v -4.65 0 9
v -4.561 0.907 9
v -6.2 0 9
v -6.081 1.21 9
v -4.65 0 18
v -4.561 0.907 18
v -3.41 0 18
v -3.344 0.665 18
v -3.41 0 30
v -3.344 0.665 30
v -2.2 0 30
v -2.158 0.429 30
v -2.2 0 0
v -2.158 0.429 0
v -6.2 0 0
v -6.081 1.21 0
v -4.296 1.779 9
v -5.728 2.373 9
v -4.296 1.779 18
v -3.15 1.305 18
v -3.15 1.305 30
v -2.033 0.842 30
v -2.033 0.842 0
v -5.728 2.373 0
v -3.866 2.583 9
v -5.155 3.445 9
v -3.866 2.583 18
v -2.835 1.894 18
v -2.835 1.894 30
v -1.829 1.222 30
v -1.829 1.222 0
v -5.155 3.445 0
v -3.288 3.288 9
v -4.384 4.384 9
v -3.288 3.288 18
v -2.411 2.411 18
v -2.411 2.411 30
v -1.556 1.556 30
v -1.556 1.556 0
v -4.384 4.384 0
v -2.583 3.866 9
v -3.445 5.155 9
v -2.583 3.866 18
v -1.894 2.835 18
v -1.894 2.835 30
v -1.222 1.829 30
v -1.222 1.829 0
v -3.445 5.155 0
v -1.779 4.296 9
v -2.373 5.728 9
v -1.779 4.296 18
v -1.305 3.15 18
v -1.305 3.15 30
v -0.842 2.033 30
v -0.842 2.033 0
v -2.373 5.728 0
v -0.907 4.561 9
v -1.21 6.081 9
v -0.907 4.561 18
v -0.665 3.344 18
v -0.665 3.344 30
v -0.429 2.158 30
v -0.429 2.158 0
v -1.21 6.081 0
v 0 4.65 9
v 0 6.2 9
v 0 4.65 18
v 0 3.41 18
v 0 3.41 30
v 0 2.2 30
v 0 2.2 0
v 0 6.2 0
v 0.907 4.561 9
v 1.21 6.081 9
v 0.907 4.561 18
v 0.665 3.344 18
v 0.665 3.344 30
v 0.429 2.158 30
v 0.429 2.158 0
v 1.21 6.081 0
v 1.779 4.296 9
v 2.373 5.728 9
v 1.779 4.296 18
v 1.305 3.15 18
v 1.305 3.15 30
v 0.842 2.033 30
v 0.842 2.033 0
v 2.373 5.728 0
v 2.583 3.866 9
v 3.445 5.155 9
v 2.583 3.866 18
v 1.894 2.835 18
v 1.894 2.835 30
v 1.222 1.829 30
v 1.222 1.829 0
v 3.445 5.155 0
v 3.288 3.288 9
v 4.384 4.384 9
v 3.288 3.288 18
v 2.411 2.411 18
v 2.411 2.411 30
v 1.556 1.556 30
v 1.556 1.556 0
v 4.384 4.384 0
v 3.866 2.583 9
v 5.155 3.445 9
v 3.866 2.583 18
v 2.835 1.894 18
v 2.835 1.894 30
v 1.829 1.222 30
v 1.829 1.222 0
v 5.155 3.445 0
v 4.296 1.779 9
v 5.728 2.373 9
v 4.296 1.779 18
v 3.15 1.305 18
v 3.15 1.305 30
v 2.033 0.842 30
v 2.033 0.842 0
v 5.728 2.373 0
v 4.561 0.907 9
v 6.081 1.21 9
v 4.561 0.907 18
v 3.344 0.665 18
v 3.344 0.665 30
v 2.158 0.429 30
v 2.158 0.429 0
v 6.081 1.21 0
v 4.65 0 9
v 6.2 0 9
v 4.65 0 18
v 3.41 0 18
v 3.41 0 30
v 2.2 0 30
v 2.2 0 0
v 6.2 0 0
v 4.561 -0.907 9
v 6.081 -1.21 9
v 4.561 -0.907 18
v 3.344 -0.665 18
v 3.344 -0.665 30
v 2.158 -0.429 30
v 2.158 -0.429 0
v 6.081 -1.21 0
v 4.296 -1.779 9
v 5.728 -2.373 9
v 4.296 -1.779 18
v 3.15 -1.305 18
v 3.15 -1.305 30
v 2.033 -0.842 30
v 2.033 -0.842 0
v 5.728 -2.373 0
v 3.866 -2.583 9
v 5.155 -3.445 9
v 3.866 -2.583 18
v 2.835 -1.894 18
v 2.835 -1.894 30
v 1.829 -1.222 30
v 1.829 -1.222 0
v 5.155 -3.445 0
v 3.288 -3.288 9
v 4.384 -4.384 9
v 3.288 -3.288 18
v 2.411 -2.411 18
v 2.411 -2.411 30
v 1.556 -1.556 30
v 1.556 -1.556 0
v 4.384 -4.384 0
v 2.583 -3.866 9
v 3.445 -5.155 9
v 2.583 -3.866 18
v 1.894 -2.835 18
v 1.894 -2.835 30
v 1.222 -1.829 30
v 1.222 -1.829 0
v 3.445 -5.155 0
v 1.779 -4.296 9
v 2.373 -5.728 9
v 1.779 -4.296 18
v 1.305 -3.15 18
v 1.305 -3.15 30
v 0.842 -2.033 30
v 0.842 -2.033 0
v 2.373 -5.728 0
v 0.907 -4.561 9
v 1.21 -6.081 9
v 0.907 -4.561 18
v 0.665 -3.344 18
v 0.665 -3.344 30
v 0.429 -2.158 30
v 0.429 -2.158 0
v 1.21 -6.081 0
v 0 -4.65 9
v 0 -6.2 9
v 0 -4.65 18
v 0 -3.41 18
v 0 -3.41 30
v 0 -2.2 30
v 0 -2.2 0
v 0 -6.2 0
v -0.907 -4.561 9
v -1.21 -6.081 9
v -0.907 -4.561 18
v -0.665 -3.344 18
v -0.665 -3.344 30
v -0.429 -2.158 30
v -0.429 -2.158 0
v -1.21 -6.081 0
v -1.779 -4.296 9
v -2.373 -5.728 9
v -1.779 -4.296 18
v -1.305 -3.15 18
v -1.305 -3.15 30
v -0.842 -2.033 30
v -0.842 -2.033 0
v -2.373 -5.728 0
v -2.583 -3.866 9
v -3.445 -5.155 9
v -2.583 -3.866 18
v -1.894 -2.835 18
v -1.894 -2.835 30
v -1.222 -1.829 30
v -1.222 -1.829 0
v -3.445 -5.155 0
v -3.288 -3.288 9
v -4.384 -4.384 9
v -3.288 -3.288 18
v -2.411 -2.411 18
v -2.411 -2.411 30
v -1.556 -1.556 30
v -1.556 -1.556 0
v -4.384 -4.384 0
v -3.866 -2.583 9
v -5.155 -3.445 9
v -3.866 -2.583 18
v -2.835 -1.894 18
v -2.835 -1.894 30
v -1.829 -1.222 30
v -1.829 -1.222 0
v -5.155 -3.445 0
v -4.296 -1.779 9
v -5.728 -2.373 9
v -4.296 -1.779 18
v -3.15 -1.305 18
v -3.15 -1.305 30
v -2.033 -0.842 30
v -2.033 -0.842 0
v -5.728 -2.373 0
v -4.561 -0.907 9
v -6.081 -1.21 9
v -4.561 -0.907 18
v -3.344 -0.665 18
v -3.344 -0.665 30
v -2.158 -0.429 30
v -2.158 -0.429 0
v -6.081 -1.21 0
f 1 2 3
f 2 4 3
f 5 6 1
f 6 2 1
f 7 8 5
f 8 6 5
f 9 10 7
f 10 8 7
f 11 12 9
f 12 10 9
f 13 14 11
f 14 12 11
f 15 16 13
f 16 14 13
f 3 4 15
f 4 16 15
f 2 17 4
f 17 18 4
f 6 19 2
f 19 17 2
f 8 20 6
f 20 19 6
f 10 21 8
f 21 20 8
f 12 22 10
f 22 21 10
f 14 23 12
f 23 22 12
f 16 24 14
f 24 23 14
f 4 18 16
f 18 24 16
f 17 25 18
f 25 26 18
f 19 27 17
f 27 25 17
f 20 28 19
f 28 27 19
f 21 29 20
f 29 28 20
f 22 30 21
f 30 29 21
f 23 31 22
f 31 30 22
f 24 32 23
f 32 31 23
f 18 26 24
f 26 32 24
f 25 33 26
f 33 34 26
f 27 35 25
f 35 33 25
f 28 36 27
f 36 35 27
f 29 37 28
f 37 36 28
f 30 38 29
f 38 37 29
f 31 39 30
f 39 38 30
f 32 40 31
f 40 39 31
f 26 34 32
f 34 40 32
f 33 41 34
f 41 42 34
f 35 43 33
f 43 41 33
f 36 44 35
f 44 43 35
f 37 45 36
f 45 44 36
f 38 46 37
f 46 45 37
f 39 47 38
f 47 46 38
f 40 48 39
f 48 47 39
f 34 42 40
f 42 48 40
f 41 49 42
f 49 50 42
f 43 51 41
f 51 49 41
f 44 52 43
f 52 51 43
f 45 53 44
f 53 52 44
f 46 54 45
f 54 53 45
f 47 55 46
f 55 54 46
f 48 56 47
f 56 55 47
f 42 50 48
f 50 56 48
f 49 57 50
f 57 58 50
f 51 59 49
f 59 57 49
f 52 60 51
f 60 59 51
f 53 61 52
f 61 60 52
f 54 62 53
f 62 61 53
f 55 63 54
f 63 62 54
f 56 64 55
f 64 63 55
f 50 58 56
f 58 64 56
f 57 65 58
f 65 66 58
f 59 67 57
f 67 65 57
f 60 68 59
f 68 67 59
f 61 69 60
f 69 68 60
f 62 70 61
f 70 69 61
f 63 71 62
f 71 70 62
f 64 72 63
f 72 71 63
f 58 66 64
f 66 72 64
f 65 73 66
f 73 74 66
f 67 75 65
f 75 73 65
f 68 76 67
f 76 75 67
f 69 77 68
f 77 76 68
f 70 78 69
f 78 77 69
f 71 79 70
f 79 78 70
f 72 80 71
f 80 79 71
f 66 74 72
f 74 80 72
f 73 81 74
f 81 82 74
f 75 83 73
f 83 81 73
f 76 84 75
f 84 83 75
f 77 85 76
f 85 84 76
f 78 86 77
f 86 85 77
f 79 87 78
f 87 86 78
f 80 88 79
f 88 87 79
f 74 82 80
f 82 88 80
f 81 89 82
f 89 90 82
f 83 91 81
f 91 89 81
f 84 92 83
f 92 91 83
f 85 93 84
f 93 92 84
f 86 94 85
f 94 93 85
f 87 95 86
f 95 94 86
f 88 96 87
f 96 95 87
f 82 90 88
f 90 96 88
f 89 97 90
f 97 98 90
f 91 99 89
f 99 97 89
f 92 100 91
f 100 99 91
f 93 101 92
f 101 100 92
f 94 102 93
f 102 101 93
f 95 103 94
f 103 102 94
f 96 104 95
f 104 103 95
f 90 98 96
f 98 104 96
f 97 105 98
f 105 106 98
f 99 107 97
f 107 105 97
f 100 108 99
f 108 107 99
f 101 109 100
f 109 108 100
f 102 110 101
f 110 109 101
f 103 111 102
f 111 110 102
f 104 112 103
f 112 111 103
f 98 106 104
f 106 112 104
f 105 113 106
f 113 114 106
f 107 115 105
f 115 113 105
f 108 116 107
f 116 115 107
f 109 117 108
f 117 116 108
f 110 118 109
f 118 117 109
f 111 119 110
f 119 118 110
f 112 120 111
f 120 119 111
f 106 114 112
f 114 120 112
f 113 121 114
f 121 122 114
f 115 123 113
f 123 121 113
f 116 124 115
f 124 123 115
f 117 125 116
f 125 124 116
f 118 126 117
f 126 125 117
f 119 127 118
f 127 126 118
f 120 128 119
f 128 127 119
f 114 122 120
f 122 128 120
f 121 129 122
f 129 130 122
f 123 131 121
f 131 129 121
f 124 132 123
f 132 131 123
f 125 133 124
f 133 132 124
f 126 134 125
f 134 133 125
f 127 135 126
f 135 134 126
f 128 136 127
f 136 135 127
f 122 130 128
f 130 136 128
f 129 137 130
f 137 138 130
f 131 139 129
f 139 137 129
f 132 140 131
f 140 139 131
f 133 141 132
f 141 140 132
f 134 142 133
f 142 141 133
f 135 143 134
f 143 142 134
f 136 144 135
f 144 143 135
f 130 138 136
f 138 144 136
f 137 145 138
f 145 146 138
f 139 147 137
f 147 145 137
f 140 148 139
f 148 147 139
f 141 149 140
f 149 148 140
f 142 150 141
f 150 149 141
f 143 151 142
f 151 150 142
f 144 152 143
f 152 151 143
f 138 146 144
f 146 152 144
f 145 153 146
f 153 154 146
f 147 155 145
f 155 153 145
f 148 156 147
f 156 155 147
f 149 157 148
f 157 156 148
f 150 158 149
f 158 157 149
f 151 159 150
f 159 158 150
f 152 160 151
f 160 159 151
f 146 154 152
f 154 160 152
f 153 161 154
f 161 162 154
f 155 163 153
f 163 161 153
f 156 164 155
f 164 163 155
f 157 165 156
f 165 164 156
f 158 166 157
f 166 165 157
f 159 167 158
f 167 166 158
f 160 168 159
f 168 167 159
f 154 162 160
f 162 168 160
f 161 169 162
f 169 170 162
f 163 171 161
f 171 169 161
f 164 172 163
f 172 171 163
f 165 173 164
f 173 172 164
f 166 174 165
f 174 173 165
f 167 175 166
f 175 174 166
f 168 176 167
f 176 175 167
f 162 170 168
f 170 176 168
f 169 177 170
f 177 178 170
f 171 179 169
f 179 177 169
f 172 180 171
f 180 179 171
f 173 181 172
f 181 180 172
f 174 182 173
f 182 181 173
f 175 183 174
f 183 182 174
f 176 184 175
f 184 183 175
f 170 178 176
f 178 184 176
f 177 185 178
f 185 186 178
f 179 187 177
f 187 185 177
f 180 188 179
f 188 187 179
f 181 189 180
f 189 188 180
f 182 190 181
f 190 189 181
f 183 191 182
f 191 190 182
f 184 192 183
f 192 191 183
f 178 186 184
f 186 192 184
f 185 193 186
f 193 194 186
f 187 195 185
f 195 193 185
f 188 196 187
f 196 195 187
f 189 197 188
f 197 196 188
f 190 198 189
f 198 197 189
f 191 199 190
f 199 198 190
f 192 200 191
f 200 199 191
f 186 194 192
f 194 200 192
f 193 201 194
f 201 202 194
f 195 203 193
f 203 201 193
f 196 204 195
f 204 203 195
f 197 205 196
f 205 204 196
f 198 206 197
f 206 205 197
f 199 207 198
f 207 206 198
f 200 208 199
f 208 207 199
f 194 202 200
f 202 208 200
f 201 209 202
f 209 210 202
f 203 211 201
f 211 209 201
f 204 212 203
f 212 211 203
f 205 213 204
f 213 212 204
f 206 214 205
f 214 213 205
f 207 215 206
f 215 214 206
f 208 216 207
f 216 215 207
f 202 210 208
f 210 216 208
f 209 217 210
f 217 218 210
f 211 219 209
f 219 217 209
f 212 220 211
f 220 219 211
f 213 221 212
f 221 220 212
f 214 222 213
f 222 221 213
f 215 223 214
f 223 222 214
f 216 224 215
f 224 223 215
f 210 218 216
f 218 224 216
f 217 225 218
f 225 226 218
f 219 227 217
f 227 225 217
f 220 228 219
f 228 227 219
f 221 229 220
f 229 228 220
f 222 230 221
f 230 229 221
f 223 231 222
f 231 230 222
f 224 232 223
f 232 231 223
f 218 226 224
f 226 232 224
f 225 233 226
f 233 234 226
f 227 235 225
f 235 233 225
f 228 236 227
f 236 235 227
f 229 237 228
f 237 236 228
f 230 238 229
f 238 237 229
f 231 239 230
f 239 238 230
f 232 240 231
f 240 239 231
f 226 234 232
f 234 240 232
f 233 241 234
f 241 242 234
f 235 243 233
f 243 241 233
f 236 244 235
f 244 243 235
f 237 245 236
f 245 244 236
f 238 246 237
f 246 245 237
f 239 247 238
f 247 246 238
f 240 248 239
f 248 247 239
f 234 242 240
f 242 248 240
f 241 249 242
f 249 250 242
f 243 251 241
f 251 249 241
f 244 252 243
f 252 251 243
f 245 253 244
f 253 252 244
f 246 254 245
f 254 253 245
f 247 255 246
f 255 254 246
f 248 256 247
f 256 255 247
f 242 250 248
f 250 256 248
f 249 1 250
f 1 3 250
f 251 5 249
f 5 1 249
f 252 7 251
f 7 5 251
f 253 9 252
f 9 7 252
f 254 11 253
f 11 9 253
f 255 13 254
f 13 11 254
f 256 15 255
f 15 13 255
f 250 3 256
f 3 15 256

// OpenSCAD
$fn = 32;

// ----------------------------------------------------------------------
// Profiled standoff: stepped spacer, 30 mm long, bore 4.4 mm
// ----------------------------------------------------------------------

// --- parameters (mm) ---
revolve_angle = 360;      // full turn around the Z axis
profile_points = 8;       // points of the closed outline

profile = [[2.2, 0], [6.2, 0], [6.2, 9], [4.65, 9], [4.65, 18], [3.41, 18], [3.41, 30], [2.2, 30]];  // single closed polygon, 8 points, counter clockwise

// --- the one profile operation ---
rotate_extrude(angle = revolve_angle) polygon(points = profile);
